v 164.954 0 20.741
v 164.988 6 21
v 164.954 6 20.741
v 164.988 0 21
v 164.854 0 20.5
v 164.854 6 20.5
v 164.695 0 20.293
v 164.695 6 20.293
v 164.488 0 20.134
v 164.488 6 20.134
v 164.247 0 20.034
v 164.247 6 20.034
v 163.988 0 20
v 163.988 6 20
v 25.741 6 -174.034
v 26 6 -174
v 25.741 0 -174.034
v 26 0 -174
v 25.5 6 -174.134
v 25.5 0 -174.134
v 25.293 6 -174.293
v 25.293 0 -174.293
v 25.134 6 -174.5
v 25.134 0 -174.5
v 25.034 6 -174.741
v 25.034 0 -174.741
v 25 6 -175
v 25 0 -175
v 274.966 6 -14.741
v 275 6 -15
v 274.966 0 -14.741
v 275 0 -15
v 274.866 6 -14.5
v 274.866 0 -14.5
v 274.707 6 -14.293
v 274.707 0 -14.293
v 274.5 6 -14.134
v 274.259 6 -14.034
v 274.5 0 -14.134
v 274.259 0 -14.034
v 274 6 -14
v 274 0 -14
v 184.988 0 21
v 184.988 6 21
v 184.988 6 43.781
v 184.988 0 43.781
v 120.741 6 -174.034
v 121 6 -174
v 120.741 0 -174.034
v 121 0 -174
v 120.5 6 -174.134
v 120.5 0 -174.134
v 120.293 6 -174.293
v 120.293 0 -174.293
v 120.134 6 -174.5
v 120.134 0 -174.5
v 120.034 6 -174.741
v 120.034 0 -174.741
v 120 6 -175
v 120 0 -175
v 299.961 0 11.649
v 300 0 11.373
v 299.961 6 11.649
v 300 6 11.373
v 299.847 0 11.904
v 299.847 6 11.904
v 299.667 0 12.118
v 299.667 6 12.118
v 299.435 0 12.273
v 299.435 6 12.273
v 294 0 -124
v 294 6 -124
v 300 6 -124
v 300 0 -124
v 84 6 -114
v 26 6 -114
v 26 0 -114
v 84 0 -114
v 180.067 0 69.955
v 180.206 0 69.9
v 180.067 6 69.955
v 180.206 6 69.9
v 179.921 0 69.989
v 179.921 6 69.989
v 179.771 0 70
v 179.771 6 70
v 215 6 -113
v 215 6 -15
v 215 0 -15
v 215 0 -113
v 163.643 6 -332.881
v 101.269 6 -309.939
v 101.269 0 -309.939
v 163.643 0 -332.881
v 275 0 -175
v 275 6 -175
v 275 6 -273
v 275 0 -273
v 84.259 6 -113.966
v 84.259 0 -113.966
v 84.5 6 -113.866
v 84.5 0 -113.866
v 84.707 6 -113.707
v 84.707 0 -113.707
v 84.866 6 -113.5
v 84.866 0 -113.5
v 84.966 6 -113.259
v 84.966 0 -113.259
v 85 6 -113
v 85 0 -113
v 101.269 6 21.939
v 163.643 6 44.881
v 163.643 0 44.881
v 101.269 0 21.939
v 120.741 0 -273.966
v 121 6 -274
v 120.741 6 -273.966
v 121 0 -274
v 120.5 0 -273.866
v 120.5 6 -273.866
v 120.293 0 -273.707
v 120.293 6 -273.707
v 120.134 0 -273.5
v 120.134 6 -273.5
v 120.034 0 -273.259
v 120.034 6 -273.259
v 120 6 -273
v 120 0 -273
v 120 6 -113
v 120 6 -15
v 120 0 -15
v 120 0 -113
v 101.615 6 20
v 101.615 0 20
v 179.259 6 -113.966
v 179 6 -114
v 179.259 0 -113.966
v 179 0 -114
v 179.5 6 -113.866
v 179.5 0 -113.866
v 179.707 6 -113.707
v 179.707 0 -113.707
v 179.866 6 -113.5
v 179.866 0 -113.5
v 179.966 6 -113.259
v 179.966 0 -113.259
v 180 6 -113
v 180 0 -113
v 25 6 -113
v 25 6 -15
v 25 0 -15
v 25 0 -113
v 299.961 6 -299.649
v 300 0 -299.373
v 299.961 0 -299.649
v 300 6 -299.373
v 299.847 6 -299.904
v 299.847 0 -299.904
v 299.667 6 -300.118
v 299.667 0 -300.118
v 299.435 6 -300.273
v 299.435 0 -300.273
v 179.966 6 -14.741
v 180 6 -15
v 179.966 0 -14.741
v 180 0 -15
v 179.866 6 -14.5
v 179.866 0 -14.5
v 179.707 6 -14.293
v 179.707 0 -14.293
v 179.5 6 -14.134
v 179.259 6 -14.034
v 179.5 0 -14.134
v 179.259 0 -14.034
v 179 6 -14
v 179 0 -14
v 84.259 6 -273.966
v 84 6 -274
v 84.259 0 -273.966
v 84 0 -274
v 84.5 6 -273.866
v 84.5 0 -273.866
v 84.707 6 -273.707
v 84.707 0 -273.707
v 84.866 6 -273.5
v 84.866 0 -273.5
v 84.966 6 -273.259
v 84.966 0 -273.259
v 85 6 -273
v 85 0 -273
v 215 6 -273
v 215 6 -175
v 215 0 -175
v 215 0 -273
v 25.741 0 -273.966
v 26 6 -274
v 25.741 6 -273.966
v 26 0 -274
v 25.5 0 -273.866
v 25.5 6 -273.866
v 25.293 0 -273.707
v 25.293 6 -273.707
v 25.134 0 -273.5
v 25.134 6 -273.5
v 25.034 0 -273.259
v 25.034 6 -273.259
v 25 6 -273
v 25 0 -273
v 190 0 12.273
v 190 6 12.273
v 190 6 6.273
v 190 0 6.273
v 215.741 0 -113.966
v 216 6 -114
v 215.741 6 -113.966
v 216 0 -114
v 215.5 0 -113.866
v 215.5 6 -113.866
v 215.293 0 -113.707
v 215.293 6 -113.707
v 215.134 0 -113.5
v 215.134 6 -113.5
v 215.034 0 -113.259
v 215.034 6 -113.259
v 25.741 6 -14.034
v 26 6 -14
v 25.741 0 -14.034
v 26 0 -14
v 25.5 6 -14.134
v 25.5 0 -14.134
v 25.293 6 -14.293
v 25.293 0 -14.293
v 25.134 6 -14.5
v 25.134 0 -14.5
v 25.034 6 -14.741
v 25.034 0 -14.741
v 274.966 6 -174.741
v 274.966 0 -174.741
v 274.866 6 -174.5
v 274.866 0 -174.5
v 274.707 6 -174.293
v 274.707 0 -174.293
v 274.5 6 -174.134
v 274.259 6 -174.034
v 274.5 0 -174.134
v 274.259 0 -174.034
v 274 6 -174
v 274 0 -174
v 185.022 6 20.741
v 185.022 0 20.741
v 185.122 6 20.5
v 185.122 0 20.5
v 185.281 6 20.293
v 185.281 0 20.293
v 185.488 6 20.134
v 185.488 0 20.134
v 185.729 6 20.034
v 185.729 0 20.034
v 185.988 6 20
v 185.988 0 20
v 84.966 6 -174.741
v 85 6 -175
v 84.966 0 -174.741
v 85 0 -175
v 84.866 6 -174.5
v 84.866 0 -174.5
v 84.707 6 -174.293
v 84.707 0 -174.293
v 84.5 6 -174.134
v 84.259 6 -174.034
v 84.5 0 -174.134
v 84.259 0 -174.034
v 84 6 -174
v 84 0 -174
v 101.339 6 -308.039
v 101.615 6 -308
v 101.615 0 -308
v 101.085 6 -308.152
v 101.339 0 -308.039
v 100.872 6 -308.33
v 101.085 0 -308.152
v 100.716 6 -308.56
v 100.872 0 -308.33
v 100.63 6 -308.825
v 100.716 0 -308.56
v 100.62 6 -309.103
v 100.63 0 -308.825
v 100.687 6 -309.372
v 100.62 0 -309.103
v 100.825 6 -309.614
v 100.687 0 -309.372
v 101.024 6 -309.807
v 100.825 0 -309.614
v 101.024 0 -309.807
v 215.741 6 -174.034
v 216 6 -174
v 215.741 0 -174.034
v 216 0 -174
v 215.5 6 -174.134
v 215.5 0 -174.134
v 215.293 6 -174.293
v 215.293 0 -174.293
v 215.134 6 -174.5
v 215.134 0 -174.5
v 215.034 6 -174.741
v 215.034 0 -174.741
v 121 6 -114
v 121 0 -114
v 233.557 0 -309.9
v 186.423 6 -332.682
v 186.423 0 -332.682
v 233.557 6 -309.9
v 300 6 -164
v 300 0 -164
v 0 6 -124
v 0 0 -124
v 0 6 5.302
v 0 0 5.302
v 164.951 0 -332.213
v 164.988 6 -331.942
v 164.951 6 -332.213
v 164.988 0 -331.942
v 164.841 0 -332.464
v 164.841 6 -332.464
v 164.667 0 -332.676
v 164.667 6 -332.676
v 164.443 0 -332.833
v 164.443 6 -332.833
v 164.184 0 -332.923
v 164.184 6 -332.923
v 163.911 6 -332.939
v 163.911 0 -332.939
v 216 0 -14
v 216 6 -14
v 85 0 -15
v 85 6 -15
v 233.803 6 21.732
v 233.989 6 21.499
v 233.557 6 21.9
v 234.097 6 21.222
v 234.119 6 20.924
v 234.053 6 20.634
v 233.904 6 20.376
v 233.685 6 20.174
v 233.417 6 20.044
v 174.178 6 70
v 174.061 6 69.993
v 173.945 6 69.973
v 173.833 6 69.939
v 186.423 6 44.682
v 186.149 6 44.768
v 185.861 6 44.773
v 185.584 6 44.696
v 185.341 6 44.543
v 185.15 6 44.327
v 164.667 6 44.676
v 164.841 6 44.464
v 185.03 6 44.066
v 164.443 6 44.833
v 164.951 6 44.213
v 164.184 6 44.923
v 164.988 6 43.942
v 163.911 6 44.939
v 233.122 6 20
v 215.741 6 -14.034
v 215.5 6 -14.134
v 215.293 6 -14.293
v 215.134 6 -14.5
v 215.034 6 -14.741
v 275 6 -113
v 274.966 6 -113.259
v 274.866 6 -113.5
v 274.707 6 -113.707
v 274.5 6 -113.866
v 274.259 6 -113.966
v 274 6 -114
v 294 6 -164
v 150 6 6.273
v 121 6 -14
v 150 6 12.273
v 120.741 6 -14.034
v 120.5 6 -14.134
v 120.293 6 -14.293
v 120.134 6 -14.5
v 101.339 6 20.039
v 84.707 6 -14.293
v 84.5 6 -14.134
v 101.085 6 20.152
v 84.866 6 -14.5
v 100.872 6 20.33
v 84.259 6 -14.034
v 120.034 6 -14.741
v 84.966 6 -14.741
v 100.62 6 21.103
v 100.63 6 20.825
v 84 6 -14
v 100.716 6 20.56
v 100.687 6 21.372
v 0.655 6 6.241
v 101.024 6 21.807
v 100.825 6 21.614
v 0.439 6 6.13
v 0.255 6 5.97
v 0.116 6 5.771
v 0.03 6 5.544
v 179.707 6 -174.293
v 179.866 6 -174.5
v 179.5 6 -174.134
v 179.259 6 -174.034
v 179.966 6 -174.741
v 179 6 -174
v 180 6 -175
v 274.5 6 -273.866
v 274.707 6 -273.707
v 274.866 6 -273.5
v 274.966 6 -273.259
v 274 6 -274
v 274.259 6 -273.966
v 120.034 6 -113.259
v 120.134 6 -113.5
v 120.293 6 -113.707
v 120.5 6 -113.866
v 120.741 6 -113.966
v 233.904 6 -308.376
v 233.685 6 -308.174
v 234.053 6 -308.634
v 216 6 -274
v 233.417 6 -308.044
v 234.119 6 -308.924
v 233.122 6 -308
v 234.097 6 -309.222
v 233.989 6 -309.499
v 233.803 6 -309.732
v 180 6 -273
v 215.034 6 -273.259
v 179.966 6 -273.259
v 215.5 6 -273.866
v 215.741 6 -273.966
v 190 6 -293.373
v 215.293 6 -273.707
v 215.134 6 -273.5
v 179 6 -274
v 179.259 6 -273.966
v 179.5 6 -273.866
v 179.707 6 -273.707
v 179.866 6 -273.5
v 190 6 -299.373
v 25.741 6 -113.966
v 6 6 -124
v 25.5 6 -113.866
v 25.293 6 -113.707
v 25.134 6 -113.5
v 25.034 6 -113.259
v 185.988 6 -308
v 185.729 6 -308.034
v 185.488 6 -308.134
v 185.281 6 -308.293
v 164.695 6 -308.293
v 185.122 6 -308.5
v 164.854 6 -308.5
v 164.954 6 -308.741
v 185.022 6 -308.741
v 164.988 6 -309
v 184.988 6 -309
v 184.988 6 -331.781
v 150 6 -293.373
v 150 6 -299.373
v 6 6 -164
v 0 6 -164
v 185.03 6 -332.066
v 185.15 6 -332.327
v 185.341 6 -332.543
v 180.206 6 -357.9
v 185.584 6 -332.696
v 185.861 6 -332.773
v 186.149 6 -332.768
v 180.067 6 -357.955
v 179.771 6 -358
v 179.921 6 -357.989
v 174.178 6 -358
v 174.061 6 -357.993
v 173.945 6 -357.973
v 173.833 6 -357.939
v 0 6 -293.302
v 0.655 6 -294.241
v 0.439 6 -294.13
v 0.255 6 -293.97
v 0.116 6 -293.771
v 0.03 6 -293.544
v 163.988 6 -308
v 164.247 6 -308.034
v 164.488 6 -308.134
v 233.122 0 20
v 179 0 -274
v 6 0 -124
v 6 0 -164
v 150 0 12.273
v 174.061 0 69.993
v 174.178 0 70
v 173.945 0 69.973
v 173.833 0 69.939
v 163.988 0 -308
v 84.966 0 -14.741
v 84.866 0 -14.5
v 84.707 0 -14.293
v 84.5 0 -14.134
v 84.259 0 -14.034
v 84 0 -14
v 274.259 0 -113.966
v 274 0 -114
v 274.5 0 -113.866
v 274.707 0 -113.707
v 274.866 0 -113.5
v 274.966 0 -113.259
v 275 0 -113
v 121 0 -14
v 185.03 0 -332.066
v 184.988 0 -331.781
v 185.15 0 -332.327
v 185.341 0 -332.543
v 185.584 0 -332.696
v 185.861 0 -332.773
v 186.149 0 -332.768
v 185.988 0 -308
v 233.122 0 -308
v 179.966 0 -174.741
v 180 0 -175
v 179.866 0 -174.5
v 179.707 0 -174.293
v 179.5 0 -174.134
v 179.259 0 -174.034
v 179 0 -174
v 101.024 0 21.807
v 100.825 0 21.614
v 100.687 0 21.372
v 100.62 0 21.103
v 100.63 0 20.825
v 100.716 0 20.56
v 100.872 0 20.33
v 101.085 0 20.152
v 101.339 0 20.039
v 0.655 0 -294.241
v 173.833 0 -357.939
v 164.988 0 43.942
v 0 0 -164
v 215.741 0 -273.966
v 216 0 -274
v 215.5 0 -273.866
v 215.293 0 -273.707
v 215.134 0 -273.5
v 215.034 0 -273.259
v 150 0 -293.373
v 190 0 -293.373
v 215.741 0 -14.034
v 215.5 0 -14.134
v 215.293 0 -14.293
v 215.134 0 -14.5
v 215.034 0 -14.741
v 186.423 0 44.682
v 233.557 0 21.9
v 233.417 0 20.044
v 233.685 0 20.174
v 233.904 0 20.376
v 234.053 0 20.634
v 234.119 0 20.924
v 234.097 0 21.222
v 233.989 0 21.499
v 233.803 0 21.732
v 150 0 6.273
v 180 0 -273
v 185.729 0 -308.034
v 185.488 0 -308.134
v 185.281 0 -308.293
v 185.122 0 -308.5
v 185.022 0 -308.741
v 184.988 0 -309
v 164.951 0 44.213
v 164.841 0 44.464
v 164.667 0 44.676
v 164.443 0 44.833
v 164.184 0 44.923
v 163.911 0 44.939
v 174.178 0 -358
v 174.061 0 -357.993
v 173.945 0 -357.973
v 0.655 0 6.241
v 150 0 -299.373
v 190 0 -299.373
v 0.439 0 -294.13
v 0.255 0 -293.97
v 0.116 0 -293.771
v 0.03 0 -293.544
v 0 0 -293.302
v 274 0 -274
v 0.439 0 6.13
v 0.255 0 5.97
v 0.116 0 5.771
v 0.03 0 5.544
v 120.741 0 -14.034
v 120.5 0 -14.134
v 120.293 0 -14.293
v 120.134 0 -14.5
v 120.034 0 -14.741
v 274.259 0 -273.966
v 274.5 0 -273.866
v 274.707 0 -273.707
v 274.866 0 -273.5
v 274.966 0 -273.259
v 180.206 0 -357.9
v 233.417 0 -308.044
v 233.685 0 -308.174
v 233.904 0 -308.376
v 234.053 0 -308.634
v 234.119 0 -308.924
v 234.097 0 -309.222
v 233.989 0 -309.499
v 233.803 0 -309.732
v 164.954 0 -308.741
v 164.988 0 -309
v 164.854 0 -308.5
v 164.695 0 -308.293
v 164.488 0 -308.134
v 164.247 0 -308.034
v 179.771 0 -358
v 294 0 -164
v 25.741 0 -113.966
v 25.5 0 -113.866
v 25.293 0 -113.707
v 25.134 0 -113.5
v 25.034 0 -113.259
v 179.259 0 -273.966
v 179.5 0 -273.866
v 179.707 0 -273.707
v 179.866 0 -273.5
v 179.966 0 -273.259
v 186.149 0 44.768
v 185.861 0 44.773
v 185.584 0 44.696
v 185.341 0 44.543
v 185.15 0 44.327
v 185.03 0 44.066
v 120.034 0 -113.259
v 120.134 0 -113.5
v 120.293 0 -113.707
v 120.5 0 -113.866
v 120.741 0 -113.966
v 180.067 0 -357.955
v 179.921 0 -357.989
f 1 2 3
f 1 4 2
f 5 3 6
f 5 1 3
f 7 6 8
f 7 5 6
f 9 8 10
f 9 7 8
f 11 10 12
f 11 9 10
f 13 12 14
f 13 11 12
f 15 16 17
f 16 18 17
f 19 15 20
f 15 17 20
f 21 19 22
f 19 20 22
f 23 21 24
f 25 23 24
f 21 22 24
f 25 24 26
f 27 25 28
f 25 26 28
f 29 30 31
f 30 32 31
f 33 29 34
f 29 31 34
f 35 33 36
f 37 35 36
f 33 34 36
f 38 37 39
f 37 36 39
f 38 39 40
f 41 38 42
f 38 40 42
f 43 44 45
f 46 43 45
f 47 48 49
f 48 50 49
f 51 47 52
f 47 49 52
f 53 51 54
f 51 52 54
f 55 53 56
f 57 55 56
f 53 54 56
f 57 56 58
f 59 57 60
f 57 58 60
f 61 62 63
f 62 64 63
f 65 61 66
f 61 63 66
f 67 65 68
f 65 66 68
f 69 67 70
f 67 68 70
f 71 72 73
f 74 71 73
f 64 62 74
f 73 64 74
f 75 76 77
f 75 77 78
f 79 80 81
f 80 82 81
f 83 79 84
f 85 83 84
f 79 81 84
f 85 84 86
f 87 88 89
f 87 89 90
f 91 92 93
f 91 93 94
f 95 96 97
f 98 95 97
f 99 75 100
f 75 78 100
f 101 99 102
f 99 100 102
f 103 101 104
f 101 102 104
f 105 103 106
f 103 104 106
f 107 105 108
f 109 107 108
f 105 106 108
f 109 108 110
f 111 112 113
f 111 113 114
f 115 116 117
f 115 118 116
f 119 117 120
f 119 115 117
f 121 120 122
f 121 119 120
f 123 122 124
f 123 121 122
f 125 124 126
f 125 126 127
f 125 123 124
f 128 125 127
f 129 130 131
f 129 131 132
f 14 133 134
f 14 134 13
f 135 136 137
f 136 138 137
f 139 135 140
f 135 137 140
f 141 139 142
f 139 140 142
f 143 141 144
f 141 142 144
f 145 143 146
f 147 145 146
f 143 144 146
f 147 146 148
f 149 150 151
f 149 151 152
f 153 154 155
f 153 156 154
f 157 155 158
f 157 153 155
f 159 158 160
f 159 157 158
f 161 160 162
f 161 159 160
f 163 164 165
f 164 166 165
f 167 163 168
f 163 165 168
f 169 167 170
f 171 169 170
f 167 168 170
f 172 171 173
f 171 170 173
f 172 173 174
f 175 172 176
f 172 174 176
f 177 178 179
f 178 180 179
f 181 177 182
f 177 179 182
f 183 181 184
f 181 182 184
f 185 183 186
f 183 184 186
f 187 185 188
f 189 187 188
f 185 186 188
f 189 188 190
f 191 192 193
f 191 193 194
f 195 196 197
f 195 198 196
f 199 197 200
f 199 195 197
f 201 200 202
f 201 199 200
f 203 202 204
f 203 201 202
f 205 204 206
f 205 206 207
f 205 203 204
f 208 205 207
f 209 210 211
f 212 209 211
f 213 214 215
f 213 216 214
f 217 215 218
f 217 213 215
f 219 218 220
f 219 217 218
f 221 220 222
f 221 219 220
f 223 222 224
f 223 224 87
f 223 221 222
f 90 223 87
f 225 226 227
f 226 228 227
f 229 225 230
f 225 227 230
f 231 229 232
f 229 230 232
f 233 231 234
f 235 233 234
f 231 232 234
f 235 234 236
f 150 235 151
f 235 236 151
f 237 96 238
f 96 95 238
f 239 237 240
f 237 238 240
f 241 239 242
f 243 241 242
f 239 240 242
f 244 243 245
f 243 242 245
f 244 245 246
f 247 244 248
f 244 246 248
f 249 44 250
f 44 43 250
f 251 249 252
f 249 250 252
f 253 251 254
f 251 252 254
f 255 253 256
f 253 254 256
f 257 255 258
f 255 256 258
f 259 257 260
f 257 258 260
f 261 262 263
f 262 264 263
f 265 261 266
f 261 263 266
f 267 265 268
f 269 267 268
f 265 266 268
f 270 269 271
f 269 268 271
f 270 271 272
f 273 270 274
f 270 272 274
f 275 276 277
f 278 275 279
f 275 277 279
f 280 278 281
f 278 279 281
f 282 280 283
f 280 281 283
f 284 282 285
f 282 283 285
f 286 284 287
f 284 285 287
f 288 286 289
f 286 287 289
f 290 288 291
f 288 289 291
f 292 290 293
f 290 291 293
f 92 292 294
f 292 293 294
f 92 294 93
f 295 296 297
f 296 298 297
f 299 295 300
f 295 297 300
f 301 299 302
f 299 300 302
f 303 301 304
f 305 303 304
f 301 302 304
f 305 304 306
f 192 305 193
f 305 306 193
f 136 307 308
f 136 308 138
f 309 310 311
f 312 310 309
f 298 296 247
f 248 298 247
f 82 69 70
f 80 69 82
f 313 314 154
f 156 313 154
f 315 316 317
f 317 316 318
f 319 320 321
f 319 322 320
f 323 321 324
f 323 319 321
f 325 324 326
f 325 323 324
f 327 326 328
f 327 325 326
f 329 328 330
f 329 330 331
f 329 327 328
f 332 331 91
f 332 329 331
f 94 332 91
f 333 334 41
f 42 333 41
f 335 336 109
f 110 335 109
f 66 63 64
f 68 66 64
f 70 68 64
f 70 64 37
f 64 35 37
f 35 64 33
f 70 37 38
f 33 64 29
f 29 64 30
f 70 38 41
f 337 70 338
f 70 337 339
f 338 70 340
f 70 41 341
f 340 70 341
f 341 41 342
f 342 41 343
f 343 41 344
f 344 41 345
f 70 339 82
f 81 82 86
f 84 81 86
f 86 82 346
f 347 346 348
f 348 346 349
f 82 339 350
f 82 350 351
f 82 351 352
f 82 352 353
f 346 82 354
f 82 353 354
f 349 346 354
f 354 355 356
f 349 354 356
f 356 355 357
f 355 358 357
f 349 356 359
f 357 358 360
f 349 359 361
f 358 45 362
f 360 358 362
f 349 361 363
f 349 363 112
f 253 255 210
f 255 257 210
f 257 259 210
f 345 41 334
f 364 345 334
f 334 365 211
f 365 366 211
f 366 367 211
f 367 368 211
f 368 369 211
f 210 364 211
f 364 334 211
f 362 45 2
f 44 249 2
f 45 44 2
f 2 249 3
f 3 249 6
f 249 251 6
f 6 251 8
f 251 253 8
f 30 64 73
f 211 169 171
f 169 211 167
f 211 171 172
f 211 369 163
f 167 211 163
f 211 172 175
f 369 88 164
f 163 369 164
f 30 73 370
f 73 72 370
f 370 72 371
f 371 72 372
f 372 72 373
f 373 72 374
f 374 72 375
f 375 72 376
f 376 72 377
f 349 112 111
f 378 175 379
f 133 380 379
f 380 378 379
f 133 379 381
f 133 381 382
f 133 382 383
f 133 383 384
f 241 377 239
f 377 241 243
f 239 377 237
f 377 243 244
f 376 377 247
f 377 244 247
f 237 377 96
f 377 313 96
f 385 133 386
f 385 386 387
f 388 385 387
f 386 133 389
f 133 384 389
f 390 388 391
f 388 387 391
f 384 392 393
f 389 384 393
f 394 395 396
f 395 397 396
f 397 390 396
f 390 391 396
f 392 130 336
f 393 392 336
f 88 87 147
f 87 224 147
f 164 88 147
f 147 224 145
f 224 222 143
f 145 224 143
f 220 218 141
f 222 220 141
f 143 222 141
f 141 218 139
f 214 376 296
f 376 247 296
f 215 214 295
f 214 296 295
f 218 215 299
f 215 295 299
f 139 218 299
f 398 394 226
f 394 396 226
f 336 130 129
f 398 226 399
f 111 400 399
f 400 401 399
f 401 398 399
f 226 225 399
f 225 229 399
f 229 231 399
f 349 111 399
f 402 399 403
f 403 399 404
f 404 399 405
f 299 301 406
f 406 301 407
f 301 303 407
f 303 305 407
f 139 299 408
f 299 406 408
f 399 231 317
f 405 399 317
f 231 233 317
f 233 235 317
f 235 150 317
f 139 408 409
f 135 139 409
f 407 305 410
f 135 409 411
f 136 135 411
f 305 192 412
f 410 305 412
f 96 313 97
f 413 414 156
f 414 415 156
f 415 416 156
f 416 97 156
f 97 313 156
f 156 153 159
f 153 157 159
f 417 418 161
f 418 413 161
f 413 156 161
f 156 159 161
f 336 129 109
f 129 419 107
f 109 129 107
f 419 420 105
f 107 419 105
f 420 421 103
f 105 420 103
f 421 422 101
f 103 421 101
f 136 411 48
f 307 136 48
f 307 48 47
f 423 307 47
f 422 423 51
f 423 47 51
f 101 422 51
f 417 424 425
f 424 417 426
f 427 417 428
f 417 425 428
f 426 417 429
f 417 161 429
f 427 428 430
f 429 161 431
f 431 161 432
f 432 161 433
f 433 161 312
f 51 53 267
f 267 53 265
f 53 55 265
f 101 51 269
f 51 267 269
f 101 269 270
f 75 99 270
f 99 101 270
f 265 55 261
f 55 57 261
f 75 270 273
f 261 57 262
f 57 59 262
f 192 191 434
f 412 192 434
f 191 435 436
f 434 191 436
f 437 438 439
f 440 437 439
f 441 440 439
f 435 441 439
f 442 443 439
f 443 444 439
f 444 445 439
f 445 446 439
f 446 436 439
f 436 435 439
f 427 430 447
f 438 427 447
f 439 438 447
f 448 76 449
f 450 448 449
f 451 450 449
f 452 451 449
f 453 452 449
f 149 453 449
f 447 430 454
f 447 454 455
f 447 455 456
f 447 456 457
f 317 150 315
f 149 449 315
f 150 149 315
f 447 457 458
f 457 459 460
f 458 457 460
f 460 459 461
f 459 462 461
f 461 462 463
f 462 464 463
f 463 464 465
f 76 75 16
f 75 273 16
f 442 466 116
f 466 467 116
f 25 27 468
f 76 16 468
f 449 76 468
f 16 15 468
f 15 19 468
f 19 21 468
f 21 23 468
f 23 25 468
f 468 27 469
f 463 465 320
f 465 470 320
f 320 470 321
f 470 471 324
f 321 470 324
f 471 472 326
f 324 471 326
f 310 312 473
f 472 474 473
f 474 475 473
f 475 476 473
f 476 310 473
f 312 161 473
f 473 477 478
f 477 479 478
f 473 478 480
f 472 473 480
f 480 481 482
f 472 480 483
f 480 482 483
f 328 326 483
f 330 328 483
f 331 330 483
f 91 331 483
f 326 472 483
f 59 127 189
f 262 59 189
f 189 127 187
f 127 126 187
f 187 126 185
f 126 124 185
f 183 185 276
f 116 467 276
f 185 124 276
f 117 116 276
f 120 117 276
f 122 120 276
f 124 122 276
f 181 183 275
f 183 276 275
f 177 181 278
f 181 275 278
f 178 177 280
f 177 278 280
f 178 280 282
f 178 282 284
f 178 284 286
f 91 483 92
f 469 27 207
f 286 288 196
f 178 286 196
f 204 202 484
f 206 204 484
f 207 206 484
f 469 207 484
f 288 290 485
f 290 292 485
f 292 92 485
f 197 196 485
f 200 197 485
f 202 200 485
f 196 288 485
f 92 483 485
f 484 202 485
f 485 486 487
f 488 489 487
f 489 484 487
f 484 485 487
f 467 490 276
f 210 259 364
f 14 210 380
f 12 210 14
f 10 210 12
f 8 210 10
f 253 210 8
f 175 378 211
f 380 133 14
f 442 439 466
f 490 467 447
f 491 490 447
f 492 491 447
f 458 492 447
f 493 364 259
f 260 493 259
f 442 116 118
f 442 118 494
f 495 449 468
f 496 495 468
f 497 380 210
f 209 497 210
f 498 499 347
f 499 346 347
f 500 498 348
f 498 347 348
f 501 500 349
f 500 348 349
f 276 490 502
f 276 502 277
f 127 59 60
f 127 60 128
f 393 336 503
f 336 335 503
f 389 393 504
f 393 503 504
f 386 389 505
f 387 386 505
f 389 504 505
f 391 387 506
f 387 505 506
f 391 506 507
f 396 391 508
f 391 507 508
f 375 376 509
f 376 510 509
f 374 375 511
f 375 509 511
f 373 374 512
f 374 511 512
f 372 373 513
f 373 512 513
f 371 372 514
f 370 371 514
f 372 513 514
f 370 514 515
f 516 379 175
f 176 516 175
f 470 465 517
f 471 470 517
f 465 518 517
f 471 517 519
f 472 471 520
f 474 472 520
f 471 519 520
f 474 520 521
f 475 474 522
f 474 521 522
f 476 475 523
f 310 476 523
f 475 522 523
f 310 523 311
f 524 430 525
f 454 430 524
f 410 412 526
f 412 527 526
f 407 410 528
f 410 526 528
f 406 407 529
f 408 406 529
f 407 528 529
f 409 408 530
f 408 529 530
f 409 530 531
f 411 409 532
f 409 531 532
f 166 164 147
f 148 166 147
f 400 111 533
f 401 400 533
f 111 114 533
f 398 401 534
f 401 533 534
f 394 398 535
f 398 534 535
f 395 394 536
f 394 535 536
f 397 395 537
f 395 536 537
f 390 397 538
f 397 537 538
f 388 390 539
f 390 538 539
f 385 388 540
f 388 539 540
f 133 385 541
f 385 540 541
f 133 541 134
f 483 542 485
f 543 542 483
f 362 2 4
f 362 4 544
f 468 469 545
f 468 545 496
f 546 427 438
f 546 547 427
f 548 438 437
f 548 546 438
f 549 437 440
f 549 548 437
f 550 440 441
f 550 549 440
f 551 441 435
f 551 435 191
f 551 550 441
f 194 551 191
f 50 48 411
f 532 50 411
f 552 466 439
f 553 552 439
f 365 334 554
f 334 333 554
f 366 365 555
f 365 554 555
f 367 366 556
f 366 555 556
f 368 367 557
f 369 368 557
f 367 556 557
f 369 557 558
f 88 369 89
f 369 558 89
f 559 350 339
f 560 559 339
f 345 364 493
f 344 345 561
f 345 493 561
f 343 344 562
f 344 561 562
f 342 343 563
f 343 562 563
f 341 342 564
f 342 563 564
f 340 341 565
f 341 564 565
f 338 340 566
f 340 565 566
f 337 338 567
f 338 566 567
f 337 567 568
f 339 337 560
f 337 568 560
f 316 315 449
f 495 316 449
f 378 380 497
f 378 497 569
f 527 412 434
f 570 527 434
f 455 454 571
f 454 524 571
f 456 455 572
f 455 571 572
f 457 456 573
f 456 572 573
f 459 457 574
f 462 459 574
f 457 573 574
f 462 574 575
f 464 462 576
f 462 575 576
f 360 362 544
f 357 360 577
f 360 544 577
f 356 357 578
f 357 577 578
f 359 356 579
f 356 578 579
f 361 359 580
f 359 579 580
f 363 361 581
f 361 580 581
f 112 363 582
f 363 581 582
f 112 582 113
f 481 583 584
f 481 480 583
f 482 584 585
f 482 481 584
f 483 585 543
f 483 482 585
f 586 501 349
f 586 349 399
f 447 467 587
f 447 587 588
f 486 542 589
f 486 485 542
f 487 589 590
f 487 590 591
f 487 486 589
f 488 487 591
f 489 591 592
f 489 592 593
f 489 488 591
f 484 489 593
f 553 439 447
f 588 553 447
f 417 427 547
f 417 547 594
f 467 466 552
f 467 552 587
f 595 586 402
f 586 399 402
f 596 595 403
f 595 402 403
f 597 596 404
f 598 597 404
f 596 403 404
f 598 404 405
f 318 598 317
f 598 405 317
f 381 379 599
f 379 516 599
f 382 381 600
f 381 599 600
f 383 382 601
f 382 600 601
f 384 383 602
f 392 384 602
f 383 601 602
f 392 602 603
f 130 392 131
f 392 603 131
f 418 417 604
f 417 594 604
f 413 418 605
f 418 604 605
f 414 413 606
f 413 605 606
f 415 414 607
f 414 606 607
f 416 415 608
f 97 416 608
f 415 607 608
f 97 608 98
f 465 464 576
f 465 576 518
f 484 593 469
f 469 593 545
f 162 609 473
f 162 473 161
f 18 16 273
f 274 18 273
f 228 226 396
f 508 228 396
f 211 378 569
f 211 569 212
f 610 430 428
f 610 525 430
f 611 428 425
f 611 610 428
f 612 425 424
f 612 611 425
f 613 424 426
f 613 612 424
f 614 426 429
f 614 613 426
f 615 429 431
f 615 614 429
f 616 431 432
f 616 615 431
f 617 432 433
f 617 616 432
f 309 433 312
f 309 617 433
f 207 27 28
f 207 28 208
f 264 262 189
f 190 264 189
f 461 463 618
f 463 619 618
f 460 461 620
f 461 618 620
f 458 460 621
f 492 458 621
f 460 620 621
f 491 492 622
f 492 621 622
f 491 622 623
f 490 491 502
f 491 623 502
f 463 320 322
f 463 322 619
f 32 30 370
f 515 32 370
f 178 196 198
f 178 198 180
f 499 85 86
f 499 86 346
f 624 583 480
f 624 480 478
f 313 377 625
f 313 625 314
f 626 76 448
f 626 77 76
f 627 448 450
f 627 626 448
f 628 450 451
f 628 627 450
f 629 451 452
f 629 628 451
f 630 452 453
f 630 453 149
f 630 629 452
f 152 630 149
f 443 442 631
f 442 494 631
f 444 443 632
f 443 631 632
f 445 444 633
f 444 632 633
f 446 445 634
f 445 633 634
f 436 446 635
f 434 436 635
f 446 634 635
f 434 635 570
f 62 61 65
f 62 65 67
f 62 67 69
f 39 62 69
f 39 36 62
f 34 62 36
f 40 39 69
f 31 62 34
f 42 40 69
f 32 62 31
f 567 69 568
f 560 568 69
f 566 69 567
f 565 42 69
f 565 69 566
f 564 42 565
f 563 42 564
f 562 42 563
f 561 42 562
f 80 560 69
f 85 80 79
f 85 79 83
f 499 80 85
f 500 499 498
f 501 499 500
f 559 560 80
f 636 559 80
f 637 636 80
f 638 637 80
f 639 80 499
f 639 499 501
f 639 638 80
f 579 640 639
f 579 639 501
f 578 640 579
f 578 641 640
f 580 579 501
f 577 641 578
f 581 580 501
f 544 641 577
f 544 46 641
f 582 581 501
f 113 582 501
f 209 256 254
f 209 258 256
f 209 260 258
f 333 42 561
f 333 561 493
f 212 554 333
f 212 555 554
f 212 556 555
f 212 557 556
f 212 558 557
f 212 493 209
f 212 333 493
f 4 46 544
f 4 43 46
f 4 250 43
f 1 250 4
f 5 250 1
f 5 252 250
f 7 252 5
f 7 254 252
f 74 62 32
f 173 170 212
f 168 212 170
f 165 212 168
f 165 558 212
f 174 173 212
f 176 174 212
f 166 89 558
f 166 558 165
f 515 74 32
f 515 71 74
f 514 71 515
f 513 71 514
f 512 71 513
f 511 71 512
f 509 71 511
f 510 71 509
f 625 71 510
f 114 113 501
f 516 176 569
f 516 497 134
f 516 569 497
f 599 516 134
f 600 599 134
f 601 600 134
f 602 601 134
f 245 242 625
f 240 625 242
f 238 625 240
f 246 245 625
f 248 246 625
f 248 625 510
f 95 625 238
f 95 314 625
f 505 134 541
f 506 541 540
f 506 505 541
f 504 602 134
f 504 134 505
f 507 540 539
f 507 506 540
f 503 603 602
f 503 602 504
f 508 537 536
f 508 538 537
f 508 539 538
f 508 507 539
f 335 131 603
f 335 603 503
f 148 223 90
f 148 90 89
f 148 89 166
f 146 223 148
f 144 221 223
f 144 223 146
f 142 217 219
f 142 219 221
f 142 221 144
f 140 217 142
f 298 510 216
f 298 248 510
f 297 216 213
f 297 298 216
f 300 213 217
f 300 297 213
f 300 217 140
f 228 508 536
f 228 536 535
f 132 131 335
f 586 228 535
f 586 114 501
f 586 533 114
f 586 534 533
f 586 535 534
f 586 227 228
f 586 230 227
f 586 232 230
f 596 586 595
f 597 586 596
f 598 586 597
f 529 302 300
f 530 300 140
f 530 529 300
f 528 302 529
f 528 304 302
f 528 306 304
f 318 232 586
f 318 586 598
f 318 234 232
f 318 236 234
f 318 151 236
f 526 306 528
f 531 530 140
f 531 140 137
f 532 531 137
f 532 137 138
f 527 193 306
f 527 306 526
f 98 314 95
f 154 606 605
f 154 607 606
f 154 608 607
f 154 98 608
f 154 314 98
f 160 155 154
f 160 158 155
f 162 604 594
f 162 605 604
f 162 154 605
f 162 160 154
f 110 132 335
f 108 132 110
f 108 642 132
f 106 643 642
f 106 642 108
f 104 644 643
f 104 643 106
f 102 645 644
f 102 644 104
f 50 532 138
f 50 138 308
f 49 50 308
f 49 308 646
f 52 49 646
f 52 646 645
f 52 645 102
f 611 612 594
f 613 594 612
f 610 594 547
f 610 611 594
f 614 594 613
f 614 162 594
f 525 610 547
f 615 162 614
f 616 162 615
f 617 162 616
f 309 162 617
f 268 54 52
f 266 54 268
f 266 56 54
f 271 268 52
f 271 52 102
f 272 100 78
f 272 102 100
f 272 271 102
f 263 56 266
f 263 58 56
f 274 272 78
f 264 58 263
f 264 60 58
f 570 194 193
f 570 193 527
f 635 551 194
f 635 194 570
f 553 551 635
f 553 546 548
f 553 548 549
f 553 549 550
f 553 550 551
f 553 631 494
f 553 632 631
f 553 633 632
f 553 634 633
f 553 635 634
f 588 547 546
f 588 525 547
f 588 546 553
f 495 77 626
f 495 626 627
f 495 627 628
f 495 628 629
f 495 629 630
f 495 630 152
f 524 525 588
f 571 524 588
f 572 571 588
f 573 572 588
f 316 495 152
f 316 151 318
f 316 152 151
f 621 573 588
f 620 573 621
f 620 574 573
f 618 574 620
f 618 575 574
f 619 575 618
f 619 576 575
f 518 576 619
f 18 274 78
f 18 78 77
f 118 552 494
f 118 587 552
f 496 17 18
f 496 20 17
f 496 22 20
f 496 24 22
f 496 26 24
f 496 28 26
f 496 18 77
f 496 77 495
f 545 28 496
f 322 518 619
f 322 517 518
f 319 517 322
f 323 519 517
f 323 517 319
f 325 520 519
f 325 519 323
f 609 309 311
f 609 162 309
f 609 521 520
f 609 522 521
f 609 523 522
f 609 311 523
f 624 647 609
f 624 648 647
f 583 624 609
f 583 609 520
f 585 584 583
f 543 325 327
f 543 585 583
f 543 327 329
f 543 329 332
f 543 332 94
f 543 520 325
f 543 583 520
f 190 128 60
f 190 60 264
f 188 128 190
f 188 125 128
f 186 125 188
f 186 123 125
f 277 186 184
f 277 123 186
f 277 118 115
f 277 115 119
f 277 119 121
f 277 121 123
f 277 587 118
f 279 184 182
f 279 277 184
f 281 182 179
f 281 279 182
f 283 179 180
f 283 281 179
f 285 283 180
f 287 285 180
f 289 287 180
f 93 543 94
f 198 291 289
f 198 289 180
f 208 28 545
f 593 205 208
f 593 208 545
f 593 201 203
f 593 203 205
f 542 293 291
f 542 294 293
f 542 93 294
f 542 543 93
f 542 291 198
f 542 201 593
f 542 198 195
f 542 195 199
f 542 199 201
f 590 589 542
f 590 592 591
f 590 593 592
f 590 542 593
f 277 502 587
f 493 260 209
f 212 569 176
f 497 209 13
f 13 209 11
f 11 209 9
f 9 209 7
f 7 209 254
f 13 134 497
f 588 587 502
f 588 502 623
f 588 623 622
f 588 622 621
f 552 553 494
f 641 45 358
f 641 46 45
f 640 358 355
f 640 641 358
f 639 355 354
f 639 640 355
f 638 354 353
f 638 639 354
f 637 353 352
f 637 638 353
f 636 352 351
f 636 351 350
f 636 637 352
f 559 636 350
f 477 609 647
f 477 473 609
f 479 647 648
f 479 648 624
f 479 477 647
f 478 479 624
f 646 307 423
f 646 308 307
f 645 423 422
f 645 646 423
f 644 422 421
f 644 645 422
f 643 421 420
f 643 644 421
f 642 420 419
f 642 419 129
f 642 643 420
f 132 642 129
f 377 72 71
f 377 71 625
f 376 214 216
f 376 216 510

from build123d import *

# Parameters (mm, degrees)
SUPPORT_DEPTH = 6
SKETCH2_W     = 60
SKETCH2_H     = 100
LITE_DEPTH    = 468.118828565
FILLET1_R     = 1
FILLET2_R     = 1
SKETCH3_W     = 6
SKETCH3_H     = 40
SKETCH3_W_2   = 40
SKETCH3_H_2   = 6
MOUNT_DEPTH   = 468.118828565


with BuildPart() as part:
    # Sketch1 → support (new body)
    with BuildSketch(Plane(origin=(0, 0, 0), x_dir=(1, 0, 0), z_dir=(0, 1, 0))):
        Polygon((300, 0), (300, -12), (180, -70), (174, -70), (0, -6), (0, 0), (0, 288), (0, 294), (174, 358), (180, 358), (300, 300), (300, 288), align=None)
    extrude(amount=SUPPORT_DEPTH)

    # Sketch2 → lite (cut, through all)
    with BuildSketch(Plane(origin=(0, 6, 0), x_dir=(1, 0, 0), z_dir=(0, 1, 0))):
        Polygon((95.999022376, -20), (164.988314579, -20), (164.988314579, -45.375371845), align=None)
        Polygon((184.988314579, -20), (184.988314579, -45.375371845), (237.489083913, -20), align=None)
        Polygon((95.999022376, 308), (164.988314579, 333.375371845), (164.988314579, 308), align=None)
        Polygon((184.988314579, 333.375371845), (237.489083913, 308), (184.988314579, 308), align=None)
        with Locations((245, 64)):
            Rectangle(SKETCH2_W, SKETCH2_H)
        with Locations((150, 64)):
            Rectangle(SKETCH2_W, SKETCH2_H)
        with Locations((55, 64)):
            Rectangle(SKETCH2_W, SKETCH2_H)
        with Locations((55, 224)):
            Rectangle(SKETCH2_W, SKETCH2_H)
        with Locations((150, 224)):
            Rectangle(SKETCH2_W, SKETCH2_H)
        with Locations((245, 224)):
            Rectangle(SKETCH2_W, SKETCH2_H)
    extrude(amount=-LITE_DEPTH, mode=Mode.SUBTRACT)

    # Fillet1
    fillet1_edges = [part.edges().sort_by_distance(p)[0] for p in [
        (0, 3, -294),
        (174, 3, -358),
        (180, 3, -358),
        (300, 3, -300),
        (300, 3, 12),
        (180, 3, 70),
        (174, 3, 70),
        (0, 3, 6),
    ]]
    fillet(fillet1_edges, radius=FILLET1_R)

    # Fillet2
    fillet2_edges = [part.edges().sort_by_distance(p)[0] for p in [
        (85, 3, -114),
        (85, 3, -14),
        (25, 3, -14),
        (25, 3, -114),
        (85, 3, -274),
        (85, 3, -174),
        (25, 3, -174),
        (25, 3, -274),
        (180, 3, -274),
        (180, 3, -174),
        (120, 3, -174),
        (120, 3, -274),
        (275, 3, -274),
        (275, 3, -174),
        (215, 3, -174),
        (215, 3, -274),
        (164.988314579, 3, 45.375371845),
        (95.999022376, 3, 20),
        (164.988314579, 3, 20),
        (184.988314579, 3, 20),
        (237.489083913, 3, 20),
        (184.988314579, 3, 45.375371845),
        (164.988314579, 3, -308),
        (95.999022376, 3, -308),
        (164.988314579, 3, -333.375371845),
        (184.988314579, 3, -308),
        (184.988314579, 3, -333.375371845),
        (237.489083913, 3, -308),
        (275, 3, -114),
        (275, 3, -14),
        (215, 3, -14),
        (215, 3, -114),
        (180, 3, -114),
        (180, 3, -14),
        (120, 3, -14),
        (120, 3, -114),
    ]]
    fillet(fillet2_edges, radius=FILLET2_R)

    # Sketch3 → mount (cut, through all)
    with BuildSketch(Plane(origin=(0, 6, 0), x_dir=(1, 0, 0), z_dir=(0, 1, 0))):
        with Locations((3, 144)):
            Rectangle(SKETCH3_W, SKETCH3_H)
        with Locations((297, 144)):
            Rectangle(SKETCH3_W, SKETCH3_H)
        with Locations((170, -9.273001814)):
            Rectangle(SKETCH3_W_2, SKETCH3_H_2)
        with Locations((170, 296.372652861)):
            Rectangle(SKETCH3_W_2, SKETCH3_H_2)
    extrude(amount=-MOUNT_DEPTH, mode=Mode.SUBTRACT)


solid = part.part
